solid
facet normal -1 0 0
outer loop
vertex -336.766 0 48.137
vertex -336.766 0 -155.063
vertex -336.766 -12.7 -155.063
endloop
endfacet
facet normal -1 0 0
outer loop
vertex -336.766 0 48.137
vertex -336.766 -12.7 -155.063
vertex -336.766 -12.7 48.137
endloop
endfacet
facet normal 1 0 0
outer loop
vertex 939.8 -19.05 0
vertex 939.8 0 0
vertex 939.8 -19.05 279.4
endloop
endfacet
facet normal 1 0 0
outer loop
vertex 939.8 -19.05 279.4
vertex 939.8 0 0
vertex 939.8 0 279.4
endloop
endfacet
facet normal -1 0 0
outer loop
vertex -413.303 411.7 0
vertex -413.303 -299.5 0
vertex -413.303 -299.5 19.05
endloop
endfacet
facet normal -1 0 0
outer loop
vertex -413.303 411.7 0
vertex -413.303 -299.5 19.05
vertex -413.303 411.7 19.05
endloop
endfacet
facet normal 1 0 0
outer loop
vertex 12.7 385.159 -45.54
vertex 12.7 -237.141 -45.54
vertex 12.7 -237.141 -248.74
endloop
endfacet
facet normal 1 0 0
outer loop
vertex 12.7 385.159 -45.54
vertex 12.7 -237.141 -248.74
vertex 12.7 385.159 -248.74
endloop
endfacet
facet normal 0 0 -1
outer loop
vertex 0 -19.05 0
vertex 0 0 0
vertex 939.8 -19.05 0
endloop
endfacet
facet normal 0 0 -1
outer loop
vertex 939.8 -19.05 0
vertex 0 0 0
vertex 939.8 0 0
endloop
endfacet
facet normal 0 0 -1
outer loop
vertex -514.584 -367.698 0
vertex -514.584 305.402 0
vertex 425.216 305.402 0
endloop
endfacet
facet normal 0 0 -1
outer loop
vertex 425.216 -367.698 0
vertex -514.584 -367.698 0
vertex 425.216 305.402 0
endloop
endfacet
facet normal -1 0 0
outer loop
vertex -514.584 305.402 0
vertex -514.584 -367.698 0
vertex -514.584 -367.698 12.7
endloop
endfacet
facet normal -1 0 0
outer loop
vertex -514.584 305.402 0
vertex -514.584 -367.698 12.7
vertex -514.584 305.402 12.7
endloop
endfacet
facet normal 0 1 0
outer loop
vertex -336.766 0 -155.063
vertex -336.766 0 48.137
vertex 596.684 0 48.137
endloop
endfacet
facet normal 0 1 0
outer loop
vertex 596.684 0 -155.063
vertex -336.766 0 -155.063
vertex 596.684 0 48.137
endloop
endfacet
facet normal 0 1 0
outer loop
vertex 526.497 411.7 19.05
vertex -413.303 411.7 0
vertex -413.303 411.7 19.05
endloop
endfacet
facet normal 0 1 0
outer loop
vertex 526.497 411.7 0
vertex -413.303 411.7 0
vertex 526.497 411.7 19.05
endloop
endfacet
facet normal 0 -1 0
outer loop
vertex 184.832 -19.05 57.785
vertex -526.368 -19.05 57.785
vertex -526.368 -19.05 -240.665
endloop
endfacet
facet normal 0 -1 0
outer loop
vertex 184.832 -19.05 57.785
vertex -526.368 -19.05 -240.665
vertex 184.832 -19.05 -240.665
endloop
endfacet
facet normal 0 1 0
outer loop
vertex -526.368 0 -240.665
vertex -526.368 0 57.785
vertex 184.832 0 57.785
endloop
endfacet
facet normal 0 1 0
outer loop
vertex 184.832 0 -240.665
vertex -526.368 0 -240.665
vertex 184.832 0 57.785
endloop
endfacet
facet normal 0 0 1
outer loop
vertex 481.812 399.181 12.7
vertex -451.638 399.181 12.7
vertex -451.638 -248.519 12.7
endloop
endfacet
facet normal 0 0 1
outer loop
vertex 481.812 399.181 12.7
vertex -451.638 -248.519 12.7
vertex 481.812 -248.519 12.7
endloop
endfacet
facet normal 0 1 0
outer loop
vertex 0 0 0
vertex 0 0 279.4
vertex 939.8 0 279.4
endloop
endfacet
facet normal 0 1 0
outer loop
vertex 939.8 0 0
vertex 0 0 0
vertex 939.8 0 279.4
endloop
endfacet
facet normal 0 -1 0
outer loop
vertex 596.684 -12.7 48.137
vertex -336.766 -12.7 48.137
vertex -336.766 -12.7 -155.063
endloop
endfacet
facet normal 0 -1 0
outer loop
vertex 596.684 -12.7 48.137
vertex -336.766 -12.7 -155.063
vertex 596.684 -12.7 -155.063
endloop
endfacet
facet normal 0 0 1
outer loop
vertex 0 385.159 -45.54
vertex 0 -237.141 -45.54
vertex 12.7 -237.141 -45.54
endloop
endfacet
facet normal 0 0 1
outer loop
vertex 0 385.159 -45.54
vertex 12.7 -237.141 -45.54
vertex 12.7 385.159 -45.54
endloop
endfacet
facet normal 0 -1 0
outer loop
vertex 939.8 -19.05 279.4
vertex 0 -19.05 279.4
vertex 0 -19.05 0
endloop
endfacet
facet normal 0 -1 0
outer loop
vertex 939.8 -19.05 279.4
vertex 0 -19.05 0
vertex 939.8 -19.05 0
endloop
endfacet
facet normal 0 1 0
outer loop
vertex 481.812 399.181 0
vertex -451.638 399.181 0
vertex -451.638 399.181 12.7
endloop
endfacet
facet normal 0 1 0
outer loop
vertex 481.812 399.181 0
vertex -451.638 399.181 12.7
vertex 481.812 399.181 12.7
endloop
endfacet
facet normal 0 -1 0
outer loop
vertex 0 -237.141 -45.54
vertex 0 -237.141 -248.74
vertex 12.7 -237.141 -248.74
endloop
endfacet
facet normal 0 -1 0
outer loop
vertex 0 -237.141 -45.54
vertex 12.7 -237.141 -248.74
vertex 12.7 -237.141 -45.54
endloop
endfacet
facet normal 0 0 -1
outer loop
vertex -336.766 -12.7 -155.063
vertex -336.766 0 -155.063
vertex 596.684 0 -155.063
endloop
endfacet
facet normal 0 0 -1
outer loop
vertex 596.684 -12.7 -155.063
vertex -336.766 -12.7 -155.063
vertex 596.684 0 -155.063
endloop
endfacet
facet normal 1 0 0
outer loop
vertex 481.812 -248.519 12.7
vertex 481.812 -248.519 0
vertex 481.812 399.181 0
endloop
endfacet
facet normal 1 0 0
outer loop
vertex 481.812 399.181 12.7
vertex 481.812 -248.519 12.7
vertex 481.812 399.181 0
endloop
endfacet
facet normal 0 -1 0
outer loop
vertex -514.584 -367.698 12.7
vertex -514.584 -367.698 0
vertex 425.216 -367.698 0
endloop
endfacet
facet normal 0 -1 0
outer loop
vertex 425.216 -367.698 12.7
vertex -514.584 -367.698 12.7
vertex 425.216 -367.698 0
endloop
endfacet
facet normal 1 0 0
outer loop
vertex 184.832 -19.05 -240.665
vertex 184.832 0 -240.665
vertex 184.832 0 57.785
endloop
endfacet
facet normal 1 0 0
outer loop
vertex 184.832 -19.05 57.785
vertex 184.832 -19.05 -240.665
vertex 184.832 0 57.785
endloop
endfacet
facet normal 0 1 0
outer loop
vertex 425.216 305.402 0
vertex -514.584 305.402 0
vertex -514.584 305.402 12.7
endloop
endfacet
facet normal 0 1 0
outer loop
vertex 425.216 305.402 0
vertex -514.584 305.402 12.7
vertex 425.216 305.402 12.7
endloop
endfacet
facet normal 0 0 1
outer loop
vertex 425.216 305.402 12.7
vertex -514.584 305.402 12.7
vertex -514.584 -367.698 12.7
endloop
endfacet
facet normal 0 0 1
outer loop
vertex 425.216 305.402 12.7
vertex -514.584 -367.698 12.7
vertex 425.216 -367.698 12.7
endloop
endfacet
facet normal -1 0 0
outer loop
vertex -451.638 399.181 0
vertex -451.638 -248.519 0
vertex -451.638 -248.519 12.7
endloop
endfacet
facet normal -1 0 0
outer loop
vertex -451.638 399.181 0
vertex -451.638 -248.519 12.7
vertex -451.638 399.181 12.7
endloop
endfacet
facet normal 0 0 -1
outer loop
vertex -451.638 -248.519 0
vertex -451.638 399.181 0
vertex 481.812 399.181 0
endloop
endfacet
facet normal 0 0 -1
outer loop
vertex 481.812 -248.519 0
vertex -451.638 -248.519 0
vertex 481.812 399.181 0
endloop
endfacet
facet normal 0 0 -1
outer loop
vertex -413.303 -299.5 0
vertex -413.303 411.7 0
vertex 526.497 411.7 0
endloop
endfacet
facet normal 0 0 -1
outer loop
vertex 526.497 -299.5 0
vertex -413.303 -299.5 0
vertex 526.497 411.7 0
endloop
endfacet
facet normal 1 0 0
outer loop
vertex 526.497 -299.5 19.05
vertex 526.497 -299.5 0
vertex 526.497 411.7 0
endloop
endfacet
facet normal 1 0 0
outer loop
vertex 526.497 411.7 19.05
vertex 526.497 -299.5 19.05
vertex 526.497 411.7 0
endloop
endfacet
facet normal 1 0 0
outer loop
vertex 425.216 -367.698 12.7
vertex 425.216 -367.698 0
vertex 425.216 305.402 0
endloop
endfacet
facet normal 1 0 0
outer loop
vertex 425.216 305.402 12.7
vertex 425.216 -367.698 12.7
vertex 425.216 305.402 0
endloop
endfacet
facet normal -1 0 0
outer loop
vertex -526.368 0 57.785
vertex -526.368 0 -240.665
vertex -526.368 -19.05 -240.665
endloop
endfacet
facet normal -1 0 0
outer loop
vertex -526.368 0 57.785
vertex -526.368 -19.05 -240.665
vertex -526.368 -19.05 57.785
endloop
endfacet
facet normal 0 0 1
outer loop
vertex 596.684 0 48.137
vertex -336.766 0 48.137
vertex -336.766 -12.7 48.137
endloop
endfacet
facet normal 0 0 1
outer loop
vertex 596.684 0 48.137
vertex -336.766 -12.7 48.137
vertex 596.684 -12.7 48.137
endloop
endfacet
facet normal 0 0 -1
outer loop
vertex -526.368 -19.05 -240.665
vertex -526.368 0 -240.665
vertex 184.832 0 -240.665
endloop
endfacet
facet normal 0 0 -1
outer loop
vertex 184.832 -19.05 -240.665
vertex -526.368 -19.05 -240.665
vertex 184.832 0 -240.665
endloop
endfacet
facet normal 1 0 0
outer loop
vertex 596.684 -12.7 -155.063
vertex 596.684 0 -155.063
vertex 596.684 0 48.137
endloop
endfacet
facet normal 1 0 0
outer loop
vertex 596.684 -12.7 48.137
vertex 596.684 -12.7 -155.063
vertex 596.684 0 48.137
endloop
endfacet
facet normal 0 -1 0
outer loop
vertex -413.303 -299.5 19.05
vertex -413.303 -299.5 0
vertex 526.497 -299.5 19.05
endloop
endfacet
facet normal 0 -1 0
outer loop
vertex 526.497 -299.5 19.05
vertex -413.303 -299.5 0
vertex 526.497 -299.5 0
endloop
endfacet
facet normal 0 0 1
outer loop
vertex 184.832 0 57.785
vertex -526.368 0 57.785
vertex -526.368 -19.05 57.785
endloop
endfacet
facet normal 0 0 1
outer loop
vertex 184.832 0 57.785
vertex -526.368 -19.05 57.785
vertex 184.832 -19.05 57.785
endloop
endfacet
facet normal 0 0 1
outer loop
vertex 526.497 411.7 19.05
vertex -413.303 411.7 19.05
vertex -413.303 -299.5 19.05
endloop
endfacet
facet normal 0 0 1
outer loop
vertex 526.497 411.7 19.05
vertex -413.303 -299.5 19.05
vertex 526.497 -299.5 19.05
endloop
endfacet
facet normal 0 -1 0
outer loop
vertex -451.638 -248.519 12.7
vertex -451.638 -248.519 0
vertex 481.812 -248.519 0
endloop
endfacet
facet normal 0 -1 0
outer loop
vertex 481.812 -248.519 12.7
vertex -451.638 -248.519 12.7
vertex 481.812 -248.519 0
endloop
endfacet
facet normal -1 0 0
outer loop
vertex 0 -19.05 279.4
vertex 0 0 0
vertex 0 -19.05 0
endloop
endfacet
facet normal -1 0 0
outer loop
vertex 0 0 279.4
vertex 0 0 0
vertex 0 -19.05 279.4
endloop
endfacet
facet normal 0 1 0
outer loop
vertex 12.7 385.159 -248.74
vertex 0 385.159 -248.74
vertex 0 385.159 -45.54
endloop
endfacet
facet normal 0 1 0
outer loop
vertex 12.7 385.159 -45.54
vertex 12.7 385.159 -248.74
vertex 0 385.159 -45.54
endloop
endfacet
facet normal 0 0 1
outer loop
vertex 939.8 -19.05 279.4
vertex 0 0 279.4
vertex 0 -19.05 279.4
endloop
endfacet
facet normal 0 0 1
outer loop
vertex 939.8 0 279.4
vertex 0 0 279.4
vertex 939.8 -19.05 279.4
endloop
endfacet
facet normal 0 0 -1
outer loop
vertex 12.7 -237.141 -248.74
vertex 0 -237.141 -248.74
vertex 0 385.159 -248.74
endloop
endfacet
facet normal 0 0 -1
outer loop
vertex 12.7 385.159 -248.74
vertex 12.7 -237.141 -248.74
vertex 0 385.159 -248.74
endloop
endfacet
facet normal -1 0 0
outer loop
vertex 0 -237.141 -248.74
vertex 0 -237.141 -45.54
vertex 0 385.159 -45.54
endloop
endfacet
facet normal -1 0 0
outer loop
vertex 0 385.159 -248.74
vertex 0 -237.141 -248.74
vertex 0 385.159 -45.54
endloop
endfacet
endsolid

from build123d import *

# Parameters (mm, degrees)
F0_W      = 939.8
F0_H      = 279.4
F1_DEPTH  = 19.05
F2_W      = 939.8
F2_H      = 711.2
F3_DEPTH  = 19.05
F4_W      = 939.8
F4_H      = 673.1
F5_DEPTH  = 12.7
F6_W      = 711.2
F6_H      = 298.45
F7_DEPTH  = 19.05
F8_W      = 933.45
F8_H      = 203.2
F9_DEPTH  = 12.7
F10_W     = 622.3
F10_H     = 203.2
F11_DEPTH = 12.7
F12_W     = 933.45
F12_H     = 647.7
F13_DEPTH = 12.7


# Not quite as in the source:
# - a length typed as a fraction of an inch, garbled in the dataset ("3 / 203.2 mm" for 3/8 in), is restored


with BuildPart() as f1:
    # F0 (on Front) → F1 (new body)
    with BuildSketch(Plane.XZ):
        with Locations((469.9, 139.7)):
            Rectangle(F0_W, F0_H)
    extrude(amount=F1_DEPTH)


with BuildPart() as f3:
    # F2 (on Top) → F3 (new body)
    with BuildSketch(Plane.XY):
        with Locations((56.5968006849, 56.099815594)):
            Rectangle(F2_W, F2_H)
    extrude(amount=F3_DEPTH)


with BuildPart() as f5:
    # F4 (on Top) → F5 (new body)
    with BuildSketch(Plane.XY):
        with Locations((-44.6838438511, -31.1480367078)):
            Rectangle(F4_W, F4_H)
    extrude(amount=F5_DEPTH)


with BuildPart() as f7:
    # F6 (on Front) → F7 (new body)
    with BuildSketch(Plane.XZ):
        with Locations((-170.7684025168, -91.4403489557)):
            Rectangle(F6_W, F6_H)
    extrude(amount=F7_DEPTH)


with BuildPart() as f9:
    # F8 (on Front) → F9 (new body)
    with BuildSketch(Plane.XZ):
        with Locations((129.9587488174, -53.4627198363)):
            Rectangle(F8_W, F8_H)
    extrude(amount=F9_DEPTH)


with BuildPart() as f11:
    # F10 (on Right) → F11 (new body)
    with BuildSketch(Plane.YZ):
        with Locations((74.0094929934, -147.1401725494)):
            Rectangle(F10_W, F10_H)
    extrude(amount=F11_DEPTH)


with BuildPart() as f13:
    # F12 (on Top) → F13 (new body)
    with BuildSketch(Plane.XY):
        with Locations((15.0867402554, 75.3309479109)):
            Rectangle(F12_W, F12_H)
    extrude(amount=F13_DEPTH)


solid = Compound([f1.part, f3.part, f5.part, f7.part, f9.part, f11.part, f13.part])
